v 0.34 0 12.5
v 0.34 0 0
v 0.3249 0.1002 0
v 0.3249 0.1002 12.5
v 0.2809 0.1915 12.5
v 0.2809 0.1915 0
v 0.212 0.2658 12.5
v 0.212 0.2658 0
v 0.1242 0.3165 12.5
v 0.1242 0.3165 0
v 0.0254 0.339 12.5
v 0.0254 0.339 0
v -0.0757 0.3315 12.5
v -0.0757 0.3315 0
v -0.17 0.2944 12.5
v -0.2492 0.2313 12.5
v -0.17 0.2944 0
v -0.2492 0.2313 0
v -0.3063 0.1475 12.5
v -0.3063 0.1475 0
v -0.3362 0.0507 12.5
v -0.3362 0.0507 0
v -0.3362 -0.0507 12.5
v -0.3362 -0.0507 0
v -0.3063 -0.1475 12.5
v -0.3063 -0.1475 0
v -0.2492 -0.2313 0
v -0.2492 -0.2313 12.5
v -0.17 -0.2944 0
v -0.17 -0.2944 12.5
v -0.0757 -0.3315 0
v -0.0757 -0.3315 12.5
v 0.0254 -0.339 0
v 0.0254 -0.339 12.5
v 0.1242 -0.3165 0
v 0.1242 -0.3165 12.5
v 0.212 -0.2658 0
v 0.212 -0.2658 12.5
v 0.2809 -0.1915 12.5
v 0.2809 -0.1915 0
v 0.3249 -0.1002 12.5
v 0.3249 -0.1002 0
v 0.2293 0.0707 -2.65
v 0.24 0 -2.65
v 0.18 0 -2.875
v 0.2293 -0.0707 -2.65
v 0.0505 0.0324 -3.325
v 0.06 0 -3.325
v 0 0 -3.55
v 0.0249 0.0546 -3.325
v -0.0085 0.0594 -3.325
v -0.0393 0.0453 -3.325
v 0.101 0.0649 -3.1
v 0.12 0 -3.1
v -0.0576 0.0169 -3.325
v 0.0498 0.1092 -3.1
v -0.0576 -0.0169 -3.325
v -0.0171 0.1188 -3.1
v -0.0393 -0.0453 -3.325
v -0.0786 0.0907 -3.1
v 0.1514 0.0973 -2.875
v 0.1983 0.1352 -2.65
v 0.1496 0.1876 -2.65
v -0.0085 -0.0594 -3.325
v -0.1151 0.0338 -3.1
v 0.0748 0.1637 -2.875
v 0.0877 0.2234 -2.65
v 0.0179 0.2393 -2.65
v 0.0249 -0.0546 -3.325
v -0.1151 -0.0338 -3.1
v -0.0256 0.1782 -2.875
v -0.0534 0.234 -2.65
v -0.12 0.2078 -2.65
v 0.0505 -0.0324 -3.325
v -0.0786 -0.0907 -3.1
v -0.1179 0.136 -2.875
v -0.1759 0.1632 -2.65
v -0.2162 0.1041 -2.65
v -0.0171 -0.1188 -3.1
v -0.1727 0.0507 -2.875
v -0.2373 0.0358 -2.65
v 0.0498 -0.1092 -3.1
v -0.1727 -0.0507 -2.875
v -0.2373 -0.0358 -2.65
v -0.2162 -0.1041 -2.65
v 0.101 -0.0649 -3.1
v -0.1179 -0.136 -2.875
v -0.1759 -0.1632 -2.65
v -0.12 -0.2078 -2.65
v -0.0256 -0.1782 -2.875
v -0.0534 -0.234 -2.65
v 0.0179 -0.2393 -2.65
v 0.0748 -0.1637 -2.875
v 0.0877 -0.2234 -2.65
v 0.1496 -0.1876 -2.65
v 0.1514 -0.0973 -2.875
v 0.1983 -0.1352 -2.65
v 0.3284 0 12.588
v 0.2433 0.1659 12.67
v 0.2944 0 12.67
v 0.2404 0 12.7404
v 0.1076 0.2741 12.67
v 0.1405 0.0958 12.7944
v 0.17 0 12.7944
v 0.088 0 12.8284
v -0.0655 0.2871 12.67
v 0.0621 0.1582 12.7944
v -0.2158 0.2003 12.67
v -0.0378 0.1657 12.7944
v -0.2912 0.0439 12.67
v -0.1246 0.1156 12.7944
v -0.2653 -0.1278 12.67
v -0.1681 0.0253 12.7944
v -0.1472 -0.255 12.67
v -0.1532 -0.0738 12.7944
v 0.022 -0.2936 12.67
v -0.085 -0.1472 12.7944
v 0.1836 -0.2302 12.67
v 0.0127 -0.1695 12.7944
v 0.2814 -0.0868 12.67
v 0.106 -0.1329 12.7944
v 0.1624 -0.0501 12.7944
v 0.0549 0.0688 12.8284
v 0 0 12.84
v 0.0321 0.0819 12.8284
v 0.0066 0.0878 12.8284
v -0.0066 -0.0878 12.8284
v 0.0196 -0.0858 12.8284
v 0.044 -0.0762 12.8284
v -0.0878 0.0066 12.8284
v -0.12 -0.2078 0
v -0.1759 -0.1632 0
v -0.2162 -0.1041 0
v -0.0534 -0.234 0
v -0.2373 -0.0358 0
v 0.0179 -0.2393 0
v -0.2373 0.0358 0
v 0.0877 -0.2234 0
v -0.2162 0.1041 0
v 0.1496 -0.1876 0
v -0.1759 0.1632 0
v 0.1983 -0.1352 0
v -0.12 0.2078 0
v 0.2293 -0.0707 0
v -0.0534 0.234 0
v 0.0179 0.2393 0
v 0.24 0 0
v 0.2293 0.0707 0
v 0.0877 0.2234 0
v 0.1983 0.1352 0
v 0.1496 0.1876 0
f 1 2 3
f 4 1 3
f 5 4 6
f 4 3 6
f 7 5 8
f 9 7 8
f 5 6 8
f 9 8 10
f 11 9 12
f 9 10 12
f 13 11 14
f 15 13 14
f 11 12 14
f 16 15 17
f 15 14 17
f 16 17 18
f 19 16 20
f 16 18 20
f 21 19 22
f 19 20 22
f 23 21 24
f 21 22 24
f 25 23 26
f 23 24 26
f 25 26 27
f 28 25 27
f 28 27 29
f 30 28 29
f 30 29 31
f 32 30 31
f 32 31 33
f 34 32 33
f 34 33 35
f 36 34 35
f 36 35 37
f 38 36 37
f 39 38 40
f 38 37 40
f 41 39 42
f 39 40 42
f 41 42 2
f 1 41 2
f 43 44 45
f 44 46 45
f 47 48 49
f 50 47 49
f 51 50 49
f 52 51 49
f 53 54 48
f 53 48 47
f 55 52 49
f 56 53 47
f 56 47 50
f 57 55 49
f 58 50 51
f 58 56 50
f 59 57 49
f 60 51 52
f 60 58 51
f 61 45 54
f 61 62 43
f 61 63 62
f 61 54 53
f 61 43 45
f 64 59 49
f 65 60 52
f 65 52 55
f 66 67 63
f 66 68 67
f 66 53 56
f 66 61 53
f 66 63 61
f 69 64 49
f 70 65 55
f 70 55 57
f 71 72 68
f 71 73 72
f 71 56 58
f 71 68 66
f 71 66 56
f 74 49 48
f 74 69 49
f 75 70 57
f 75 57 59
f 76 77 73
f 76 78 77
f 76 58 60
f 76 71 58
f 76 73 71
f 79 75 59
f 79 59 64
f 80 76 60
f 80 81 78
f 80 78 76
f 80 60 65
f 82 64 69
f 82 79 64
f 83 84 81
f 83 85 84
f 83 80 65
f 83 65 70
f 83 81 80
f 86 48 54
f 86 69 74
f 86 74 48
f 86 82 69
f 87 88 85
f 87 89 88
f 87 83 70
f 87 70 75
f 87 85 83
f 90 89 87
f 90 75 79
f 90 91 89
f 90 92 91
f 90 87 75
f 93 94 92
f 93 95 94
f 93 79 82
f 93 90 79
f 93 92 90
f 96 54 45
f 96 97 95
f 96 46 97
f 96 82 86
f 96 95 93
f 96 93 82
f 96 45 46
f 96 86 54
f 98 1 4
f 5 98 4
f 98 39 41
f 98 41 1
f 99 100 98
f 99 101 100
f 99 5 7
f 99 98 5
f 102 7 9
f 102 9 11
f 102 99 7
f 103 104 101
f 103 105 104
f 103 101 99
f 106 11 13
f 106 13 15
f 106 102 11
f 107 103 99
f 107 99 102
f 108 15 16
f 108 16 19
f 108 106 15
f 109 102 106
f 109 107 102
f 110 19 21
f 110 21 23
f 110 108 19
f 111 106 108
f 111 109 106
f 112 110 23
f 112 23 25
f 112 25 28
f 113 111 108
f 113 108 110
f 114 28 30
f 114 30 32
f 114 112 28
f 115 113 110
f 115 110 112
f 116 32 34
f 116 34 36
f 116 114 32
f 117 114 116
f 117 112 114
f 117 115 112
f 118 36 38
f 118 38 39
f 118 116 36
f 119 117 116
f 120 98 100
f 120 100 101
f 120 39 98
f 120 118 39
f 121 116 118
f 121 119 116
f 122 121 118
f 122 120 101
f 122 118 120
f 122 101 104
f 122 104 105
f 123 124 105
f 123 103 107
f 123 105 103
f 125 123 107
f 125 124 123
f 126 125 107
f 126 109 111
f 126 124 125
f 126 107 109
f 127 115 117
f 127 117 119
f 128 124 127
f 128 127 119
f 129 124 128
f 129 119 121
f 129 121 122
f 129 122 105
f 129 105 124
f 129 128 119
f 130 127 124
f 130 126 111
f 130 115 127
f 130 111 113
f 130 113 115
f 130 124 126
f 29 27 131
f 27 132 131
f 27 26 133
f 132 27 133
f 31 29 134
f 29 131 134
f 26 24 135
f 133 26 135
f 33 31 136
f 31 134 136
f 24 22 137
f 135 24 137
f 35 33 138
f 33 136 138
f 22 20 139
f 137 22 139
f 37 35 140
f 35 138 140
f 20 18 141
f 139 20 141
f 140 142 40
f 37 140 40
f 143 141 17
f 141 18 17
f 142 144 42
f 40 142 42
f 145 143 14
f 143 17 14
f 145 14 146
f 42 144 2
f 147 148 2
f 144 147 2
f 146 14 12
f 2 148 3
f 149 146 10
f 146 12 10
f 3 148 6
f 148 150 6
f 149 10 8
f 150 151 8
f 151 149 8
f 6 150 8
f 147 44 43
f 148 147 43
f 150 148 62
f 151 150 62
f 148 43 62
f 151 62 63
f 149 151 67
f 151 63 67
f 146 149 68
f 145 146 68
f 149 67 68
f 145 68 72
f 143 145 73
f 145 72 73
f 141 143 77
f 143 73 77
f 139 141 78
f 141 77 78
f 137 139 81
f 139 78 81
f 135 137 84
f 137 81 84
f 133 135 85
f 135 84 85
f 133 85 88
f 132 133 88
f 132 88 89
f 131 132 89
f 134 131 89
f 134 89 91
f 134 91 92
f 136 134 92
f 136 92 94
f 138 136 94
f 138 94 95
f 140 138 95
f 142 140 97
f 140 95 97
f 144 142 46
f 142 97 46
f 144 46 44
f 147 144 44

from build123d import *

# Parameters (mm, degrees)
CYLINDER_R        = 0.34
CYLINDER_DEPTH    = 12.5
CYLINDER002_R     = 0.24
CYLINDER002_DEPTH = 2.65


with BuildPart() as cone:
    # Cone → Cone (revolve)
    with BuildSketch(Plane(origin=(0, 0, -3.55), x_dir=(1, 0, 0), z_dir=(0, -1, 0))):
        Polygon((0, 0), (0.24, 0.9), (0, 0.9), align=None)
    revolve(axis=Axis((0, 0, -3.55), (0, 0, 1)))


with BuildPart() as body:
    # Cylinder → Cylinder (new body)
    with BuildSketch(Plane.XY):
        Circle(CYLINDER_R)
    extrude(amount=CYLINDER_DEPTH)


with BuildPart() as pin:
    # Cylinder002 → Cylinder002 (new body)
    with BuildSketch(Plane.XY.offset(-2.65)):
        Circle(CYLINDER002_R)
    extrude(amount=CYLINDER002_DEPTH)


with BuildPart() as pogo_pin:
    # Sphere → Sphere (revolve)
    with BuildSketch(Plane(origin=(0, 0, 12.5), x_dir=(1, 0, 0), z_dir=(0, -1, 0))):
        with BuildLine():
            ThreePointArc((0.34, 0), (0.240416, 0.240416), (0, 0.34))
            Line((0, 0.34), (0, 0))
            Line((0, 0), (0.34, 0))
        make_face()
    revolve(axis=Axis((0, 0, 12.5), (0, 0, 1)))

    # Fusion001: union Cone, Body, Pin
    add(cone.part)
    add(body.part)
    add(pin.part)


solid = pogo_pin.part
